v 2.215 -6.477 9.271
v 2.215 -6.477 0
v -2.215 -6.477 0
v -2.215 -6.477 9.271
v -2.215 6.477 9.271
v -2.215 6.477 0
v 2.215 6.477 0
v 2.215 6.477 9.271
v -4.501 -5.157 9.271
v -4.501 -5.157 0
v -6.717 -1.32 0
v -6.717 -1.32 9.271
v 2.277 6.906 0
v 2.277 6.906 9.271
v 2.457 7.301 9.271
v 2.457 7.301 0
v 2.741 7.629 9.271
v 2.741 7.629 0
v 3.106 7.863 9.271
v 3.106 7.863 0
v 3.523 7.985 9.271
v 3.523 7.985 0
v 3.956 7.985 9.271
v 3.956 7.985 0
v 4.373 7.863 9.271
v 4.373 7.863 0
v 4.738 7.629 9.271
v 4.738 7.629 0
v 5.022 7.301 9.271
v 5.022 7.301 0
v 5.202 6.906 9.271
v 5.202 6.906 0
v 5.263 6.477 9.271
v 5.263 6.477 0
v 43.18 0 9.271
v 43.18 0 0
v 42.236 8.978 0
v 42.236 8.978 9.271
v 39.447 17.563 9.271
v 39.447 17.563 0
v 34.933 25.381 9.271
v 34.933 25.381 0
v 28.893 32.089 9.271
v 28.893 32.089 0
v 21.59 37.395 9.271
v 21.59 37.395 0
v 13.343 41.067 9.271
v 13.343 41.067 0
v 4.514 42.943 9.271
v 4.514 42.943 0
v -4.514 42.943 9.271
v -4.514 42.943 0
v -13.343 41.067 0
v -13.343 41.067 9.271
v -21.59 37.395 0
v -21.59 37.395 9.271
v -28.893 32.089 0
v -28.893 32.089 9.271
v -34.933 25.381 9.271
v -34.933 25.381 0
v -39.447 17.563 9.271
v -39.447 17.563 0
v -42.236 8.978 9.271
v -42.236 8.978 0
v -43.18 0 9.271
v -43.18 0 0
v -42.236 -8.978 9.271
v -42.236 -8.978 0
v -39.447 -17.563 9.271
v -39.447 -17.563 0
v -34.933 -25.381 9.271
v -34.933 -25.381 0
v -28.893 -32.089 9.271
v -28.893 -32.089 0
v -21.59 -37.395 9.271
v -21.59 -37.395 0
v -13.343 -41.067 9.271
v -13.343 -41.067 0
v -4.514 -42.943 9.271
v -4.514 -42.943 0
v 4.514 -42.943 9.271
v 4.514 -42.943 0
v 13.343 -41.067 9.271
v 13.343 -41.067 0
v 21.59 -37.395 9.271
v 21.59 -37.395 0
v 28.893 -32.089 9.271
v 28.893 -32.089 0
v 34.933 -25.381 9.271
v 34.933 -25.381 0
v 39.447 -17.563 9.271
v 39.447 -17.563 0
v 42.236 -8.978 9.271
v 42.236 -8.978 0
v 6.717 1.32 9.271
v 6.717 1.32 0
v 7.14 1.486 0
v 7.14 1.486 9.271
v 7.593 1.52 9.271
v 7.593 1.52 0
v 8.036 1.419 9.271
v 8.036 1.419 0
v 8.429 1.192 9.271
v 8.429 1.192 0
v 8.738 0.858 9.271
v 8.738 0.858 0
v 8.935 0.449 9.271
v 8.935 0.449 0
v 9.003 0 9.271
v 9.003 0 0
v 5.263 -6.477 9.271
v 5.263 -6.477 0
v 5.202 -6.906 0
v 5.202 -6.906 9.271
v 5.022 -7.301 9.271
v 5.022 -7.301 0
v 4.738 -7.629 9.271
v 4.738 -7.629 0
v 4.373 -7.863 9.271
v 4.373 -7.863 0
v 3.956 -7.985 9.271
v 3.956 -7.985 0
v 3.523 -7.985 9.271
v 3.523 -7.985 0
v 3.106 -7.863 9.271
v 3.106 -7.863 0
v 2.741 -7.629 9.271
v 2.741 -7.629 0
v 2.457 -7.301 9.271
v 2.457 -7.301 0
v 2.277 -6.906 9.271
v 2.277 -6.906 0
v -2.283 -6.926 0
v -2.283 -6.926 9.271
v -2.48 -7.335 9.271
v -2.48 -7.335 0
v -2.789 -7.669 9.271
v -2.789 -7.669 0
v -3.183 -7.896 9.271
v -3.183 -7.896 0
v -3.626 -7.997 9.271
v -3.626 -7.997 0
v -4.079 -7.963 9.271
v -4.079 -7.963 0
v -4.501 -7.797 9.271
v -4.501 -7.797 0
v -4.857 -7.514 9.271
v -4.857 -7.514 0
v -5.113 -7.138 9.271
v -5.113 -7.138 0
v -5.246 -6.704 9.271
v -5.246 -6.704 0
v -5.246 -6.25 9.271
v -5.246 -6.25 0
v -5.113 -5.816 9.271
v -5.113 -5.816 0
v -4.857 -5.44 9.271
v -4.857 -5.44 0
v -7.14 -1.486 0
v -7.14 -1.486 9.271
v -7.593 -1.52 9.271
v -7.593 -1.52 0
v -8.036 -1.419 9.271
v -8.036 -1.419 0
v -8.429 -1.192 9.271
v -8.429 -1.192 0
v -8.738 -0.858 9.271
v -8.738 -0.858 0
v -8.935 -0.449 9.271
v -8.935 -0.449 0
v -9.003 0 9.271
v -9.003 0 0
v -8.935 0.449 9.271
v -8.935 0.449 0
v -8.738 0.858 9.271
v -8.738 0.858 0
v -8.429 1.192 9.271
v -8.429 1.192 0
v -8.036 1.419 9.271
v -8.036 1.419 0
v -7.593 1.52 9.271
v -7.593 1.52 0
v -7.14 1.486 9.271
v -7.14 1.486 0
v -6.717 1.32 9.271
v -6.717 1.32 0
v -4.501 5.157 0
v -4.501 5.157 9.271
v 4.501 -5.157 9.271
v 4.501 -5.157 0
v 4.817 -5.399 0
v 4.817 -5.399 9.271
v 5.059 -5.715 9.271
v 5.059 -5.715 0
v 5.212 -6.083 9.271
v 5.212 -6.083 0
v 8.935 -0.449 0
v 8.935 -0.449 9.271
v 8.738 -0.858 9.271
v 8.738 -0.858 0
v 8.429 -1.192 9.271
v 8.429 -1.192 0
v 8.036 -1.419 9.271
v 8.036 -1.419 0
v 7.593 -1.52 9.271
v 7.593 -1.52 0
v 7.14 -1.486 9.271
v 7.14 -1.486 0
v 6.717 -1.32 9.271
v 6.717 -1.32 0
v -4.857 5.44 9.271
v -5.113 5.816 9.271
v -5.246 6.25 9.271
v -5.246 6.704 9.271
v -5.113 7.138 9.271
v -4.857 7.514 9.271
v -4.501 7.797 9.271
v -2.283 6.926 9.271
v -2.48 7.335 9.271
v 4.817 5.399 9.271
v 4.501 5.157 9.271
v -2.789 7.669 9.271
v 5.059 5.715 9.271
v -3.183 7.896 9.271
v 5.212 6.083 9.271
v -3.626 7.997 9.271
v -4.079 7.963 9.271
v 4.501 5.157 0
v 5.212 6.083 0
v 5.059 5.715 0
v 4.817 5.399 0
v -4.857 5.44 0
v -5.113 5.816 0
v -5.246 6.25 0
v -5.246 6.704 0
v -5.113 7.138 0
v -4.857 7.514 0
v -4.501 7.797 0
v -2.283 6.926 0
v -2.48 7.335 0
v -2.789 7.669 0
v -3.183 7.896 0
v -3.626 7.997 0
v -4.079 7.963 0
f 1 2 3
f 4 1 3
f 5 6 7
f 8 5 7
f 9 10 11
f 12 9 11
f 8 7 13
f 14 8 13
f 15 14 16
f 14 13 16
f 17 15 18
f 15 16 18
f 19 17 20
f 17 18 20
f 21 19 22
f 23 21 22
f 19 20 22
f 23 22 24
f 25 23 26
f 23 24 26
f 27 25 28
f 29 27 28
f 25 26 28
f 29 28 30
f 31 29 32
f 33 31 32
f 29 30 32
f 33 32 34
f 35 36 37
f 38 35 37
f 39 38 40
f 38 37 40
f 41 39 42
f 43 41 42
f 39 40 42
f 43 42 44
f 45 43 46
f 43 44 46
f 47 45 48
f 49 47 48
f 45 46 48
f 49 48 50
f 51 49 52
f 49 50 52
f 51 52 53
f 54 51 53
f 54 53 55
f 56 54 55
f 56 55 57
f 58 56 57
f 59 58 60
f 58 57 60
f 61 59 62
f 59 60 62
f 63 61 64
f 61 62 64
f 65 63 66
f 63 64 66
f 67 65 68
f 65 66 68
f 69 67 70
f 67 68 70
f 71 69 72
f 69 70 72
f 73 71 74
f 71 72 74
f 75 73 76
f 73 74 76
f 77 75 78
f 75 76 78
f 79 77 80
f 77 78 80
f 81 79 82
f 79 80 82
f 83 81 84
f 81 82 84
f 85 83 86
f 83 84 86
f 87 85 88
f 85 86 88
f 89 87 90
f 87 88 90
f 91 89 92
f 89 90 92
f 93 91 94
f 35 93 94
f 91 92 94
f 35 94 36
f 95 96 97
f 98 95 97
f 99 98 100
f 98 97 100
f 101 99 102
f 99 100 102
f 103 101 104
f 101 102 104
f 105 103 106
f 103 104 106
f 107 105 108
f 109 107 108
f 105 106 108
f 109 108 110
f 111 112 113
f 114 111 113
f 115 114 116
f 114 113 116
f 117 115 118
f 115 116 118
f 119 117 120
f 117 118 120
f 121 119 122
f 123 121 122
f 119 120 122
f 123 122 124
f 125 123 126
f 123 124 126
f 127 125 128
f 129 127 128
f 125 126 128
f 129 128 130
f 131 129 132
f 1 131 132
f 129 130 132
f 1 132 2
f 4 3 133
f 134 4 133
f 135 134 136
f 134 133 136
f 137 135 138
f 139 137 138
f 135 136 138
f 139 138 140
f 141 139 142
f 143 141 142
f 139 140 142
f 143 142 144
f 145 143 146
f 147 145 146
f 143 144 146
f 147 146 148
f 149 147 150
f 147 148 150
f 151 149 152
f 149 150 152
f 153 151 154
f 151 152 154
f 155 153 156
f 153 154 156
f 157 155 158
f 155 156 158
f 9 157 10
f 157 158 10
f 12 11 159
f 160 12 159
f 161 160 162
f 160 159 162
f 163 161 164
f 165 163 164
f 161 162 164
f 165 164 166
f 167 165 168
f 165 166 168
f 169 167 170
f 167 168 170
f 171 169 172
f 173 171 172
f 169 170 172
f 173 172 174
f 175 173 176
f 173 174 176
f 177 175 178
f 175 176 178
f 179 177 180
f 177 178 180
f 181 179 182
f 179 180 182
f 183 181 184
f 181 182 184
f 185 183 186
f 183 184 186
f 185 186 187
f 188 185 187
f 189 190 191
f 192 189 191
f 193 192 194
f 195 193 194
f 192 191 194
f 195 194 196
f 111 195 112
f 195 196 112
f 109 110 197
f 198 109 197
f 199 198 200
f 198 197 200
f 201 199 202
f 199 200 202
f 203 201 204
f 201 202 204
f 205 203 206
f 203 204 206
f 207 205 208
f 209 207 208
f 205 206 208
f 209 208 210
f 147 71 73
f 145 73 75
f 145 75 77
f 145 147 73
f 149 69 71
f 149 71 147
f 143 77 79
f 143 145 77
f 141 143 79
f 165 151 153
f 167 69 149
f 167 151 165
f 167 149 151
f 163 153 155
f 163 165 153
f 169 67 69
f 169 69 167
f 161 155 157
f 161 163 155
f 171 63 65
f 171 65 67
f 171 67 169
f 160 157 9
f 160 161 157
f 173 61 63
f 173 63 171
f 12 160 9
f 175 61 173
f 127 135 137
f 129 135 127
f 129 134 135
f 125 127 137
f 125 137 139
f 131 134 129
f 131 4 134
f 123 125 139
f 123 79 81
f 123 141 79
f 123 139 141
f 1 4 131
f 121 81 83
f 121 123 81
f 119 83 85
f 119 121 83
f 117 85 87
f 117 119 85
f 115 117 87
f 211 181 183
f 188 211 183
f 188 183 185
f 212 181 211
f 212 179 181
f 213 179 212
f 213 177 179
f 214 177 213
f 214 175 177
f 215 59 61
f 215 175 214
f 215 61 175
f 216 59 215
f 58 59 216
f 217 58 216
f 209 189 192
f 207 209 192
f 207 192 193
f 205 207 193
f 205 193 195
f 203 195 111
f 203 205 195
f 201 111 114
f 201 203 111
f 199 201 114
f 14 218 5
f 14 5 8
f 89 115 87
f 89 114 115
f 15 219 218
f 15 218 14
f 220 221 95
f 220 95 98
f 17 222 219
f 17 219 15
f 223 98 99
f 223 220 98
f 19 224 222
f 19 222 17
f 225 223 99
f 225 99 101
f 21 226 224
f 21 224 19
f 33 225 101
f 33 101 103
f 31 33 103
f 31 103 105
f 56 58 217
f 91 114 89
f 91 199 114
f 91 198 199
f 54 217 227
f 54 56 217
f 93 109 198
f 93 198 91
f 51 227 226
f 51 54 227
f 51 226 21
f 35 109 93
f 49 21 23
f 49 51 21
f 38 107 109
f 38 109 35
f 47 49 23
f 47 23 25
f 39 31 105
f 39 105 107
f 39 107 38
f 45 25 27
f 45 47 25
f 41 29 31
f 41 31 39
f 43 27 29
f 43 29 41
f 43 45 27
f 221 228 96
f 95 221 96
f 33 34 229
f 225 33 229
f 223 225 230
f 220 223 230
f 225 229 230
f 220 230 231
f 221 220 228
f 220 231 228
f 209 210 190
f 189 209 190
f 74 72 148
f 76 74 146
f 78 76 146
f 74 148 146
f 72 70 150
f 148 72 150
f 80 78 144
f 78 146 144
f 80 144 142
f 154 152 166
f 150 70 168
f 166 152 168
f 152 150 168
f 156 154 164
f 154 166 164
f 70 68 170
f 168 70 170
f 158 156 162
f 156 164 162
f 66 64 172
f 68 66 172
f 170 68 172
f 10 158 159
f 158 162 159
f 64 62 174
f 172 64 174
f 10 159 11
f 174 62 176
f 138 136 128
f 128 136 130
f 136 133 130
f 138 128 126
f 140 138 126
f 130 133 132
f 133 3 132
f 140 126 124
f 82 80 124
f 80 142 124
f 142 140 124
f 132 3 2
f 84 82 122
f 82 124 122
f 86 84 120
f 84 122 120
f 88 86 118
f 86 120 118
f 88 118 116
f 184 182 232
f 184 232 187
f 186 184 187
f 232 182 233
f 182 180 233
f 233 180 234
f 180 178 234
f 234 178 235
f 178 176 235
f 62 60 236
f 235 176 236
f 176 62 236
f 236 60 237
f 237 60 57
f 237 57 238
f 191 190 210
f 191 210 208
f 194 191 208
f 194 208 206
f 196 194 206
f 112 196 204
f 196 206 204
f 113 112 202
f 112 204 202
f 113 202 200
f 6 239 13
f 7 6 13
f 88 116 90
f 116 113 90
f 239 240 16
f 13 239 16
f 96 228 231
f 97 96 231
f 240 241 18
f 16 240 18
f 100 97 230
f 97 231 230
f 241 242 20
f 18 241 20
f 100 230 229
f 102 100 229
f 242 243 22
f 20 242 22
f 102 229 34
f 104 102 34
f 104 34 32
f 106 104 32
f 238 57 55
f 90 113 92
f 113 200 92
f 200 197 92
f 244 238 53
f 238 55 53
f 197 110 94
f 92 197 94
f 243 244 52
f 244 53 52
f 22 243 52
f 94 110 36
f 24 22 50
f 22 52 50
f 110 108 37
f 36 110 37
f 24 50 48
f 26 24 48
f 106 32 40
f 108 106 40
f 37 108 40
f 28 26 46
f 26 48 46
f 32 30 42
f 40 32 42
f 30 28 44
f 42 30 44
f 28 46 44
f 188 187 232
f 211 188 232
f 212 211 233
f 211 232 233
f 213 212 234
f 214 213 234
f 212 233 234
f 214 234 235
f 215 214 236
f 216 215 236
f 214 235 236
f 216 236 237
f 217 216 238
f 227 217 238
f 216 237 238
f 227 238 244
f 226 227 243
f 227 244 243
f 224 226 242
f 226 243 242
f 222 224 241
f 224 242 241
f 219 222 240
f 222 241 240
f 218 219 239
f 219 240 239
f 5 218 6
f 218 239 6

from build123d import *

# Parameters (mm, degrees)
SKETCH1_R           = 43.18
BOSS_EXTRUDE1_DEPTH = 9.271


with BuildPart() as part:
    # Sketch1 → Boss-Extrude1 (new body)
    with BuildSketch(Plane.XY):
        Circle(SKETCH1_R)
        with BuildLine():
            Line((4.501497694, 5.157177285), (6.716995387, 1.319822715))
            ThreePointArc((6.716995387, 1.319822715), (8.240995387, 1.319822715), (9.002995387, 0))
            ThreePointArc((9.002995387, 0), (8.240995387, -1.319822715), (6.716995387, -1.319822715))
            Line((6.716995387, -1.319822715), (4.501497694, -5.157177285))
            ThreePointArc((4.501497694, -5.157177285), (5.059320409, -5.715), (5.263497694, -6.477))
            ThreePointArc((5.263497694, -6.477), (3.739497694, -8.001), (2.215497694, -6.477))
            Line((2.215497694, -6.477), (-2.215497694, -6.477))
            ThreePointArc((-2.215497694, -6.477), (-4.501497694, -7.796822715), (-4.501497694, -5.157177285))
            Line((-4.501497694, -5.157177285), (-6.716995387, -1.319822715))
            ThreePointArc((-6.716995387, -1.319822715), (-9.002995387, 0), (-6.716995387, 1.319822715))
            Line((-6.716995387, 1.319822715), (-4.501497694, 5.157177285))
            ThreePointArc((-4.501497694, 5.157177285), (-4.501497694, 7.796822715), (-2.215497694, 6.477))
            Line((-2.215497694, 6.477), (2.215497694, 6.477))
            ThreePointArc((2.215497694, 6.477), (3.739497694, 8.001), (5.263497694, 6.477))
            ThreePointArc((5.263497694, 6.477), (5.059320409, 5.715), (4.501497694, 5.157177285))
        make_face(mode=Mode.SUBTRACT)
    extrude(amount=BOSS_EXTRUDE1_DEPTH)


solid = part.part
